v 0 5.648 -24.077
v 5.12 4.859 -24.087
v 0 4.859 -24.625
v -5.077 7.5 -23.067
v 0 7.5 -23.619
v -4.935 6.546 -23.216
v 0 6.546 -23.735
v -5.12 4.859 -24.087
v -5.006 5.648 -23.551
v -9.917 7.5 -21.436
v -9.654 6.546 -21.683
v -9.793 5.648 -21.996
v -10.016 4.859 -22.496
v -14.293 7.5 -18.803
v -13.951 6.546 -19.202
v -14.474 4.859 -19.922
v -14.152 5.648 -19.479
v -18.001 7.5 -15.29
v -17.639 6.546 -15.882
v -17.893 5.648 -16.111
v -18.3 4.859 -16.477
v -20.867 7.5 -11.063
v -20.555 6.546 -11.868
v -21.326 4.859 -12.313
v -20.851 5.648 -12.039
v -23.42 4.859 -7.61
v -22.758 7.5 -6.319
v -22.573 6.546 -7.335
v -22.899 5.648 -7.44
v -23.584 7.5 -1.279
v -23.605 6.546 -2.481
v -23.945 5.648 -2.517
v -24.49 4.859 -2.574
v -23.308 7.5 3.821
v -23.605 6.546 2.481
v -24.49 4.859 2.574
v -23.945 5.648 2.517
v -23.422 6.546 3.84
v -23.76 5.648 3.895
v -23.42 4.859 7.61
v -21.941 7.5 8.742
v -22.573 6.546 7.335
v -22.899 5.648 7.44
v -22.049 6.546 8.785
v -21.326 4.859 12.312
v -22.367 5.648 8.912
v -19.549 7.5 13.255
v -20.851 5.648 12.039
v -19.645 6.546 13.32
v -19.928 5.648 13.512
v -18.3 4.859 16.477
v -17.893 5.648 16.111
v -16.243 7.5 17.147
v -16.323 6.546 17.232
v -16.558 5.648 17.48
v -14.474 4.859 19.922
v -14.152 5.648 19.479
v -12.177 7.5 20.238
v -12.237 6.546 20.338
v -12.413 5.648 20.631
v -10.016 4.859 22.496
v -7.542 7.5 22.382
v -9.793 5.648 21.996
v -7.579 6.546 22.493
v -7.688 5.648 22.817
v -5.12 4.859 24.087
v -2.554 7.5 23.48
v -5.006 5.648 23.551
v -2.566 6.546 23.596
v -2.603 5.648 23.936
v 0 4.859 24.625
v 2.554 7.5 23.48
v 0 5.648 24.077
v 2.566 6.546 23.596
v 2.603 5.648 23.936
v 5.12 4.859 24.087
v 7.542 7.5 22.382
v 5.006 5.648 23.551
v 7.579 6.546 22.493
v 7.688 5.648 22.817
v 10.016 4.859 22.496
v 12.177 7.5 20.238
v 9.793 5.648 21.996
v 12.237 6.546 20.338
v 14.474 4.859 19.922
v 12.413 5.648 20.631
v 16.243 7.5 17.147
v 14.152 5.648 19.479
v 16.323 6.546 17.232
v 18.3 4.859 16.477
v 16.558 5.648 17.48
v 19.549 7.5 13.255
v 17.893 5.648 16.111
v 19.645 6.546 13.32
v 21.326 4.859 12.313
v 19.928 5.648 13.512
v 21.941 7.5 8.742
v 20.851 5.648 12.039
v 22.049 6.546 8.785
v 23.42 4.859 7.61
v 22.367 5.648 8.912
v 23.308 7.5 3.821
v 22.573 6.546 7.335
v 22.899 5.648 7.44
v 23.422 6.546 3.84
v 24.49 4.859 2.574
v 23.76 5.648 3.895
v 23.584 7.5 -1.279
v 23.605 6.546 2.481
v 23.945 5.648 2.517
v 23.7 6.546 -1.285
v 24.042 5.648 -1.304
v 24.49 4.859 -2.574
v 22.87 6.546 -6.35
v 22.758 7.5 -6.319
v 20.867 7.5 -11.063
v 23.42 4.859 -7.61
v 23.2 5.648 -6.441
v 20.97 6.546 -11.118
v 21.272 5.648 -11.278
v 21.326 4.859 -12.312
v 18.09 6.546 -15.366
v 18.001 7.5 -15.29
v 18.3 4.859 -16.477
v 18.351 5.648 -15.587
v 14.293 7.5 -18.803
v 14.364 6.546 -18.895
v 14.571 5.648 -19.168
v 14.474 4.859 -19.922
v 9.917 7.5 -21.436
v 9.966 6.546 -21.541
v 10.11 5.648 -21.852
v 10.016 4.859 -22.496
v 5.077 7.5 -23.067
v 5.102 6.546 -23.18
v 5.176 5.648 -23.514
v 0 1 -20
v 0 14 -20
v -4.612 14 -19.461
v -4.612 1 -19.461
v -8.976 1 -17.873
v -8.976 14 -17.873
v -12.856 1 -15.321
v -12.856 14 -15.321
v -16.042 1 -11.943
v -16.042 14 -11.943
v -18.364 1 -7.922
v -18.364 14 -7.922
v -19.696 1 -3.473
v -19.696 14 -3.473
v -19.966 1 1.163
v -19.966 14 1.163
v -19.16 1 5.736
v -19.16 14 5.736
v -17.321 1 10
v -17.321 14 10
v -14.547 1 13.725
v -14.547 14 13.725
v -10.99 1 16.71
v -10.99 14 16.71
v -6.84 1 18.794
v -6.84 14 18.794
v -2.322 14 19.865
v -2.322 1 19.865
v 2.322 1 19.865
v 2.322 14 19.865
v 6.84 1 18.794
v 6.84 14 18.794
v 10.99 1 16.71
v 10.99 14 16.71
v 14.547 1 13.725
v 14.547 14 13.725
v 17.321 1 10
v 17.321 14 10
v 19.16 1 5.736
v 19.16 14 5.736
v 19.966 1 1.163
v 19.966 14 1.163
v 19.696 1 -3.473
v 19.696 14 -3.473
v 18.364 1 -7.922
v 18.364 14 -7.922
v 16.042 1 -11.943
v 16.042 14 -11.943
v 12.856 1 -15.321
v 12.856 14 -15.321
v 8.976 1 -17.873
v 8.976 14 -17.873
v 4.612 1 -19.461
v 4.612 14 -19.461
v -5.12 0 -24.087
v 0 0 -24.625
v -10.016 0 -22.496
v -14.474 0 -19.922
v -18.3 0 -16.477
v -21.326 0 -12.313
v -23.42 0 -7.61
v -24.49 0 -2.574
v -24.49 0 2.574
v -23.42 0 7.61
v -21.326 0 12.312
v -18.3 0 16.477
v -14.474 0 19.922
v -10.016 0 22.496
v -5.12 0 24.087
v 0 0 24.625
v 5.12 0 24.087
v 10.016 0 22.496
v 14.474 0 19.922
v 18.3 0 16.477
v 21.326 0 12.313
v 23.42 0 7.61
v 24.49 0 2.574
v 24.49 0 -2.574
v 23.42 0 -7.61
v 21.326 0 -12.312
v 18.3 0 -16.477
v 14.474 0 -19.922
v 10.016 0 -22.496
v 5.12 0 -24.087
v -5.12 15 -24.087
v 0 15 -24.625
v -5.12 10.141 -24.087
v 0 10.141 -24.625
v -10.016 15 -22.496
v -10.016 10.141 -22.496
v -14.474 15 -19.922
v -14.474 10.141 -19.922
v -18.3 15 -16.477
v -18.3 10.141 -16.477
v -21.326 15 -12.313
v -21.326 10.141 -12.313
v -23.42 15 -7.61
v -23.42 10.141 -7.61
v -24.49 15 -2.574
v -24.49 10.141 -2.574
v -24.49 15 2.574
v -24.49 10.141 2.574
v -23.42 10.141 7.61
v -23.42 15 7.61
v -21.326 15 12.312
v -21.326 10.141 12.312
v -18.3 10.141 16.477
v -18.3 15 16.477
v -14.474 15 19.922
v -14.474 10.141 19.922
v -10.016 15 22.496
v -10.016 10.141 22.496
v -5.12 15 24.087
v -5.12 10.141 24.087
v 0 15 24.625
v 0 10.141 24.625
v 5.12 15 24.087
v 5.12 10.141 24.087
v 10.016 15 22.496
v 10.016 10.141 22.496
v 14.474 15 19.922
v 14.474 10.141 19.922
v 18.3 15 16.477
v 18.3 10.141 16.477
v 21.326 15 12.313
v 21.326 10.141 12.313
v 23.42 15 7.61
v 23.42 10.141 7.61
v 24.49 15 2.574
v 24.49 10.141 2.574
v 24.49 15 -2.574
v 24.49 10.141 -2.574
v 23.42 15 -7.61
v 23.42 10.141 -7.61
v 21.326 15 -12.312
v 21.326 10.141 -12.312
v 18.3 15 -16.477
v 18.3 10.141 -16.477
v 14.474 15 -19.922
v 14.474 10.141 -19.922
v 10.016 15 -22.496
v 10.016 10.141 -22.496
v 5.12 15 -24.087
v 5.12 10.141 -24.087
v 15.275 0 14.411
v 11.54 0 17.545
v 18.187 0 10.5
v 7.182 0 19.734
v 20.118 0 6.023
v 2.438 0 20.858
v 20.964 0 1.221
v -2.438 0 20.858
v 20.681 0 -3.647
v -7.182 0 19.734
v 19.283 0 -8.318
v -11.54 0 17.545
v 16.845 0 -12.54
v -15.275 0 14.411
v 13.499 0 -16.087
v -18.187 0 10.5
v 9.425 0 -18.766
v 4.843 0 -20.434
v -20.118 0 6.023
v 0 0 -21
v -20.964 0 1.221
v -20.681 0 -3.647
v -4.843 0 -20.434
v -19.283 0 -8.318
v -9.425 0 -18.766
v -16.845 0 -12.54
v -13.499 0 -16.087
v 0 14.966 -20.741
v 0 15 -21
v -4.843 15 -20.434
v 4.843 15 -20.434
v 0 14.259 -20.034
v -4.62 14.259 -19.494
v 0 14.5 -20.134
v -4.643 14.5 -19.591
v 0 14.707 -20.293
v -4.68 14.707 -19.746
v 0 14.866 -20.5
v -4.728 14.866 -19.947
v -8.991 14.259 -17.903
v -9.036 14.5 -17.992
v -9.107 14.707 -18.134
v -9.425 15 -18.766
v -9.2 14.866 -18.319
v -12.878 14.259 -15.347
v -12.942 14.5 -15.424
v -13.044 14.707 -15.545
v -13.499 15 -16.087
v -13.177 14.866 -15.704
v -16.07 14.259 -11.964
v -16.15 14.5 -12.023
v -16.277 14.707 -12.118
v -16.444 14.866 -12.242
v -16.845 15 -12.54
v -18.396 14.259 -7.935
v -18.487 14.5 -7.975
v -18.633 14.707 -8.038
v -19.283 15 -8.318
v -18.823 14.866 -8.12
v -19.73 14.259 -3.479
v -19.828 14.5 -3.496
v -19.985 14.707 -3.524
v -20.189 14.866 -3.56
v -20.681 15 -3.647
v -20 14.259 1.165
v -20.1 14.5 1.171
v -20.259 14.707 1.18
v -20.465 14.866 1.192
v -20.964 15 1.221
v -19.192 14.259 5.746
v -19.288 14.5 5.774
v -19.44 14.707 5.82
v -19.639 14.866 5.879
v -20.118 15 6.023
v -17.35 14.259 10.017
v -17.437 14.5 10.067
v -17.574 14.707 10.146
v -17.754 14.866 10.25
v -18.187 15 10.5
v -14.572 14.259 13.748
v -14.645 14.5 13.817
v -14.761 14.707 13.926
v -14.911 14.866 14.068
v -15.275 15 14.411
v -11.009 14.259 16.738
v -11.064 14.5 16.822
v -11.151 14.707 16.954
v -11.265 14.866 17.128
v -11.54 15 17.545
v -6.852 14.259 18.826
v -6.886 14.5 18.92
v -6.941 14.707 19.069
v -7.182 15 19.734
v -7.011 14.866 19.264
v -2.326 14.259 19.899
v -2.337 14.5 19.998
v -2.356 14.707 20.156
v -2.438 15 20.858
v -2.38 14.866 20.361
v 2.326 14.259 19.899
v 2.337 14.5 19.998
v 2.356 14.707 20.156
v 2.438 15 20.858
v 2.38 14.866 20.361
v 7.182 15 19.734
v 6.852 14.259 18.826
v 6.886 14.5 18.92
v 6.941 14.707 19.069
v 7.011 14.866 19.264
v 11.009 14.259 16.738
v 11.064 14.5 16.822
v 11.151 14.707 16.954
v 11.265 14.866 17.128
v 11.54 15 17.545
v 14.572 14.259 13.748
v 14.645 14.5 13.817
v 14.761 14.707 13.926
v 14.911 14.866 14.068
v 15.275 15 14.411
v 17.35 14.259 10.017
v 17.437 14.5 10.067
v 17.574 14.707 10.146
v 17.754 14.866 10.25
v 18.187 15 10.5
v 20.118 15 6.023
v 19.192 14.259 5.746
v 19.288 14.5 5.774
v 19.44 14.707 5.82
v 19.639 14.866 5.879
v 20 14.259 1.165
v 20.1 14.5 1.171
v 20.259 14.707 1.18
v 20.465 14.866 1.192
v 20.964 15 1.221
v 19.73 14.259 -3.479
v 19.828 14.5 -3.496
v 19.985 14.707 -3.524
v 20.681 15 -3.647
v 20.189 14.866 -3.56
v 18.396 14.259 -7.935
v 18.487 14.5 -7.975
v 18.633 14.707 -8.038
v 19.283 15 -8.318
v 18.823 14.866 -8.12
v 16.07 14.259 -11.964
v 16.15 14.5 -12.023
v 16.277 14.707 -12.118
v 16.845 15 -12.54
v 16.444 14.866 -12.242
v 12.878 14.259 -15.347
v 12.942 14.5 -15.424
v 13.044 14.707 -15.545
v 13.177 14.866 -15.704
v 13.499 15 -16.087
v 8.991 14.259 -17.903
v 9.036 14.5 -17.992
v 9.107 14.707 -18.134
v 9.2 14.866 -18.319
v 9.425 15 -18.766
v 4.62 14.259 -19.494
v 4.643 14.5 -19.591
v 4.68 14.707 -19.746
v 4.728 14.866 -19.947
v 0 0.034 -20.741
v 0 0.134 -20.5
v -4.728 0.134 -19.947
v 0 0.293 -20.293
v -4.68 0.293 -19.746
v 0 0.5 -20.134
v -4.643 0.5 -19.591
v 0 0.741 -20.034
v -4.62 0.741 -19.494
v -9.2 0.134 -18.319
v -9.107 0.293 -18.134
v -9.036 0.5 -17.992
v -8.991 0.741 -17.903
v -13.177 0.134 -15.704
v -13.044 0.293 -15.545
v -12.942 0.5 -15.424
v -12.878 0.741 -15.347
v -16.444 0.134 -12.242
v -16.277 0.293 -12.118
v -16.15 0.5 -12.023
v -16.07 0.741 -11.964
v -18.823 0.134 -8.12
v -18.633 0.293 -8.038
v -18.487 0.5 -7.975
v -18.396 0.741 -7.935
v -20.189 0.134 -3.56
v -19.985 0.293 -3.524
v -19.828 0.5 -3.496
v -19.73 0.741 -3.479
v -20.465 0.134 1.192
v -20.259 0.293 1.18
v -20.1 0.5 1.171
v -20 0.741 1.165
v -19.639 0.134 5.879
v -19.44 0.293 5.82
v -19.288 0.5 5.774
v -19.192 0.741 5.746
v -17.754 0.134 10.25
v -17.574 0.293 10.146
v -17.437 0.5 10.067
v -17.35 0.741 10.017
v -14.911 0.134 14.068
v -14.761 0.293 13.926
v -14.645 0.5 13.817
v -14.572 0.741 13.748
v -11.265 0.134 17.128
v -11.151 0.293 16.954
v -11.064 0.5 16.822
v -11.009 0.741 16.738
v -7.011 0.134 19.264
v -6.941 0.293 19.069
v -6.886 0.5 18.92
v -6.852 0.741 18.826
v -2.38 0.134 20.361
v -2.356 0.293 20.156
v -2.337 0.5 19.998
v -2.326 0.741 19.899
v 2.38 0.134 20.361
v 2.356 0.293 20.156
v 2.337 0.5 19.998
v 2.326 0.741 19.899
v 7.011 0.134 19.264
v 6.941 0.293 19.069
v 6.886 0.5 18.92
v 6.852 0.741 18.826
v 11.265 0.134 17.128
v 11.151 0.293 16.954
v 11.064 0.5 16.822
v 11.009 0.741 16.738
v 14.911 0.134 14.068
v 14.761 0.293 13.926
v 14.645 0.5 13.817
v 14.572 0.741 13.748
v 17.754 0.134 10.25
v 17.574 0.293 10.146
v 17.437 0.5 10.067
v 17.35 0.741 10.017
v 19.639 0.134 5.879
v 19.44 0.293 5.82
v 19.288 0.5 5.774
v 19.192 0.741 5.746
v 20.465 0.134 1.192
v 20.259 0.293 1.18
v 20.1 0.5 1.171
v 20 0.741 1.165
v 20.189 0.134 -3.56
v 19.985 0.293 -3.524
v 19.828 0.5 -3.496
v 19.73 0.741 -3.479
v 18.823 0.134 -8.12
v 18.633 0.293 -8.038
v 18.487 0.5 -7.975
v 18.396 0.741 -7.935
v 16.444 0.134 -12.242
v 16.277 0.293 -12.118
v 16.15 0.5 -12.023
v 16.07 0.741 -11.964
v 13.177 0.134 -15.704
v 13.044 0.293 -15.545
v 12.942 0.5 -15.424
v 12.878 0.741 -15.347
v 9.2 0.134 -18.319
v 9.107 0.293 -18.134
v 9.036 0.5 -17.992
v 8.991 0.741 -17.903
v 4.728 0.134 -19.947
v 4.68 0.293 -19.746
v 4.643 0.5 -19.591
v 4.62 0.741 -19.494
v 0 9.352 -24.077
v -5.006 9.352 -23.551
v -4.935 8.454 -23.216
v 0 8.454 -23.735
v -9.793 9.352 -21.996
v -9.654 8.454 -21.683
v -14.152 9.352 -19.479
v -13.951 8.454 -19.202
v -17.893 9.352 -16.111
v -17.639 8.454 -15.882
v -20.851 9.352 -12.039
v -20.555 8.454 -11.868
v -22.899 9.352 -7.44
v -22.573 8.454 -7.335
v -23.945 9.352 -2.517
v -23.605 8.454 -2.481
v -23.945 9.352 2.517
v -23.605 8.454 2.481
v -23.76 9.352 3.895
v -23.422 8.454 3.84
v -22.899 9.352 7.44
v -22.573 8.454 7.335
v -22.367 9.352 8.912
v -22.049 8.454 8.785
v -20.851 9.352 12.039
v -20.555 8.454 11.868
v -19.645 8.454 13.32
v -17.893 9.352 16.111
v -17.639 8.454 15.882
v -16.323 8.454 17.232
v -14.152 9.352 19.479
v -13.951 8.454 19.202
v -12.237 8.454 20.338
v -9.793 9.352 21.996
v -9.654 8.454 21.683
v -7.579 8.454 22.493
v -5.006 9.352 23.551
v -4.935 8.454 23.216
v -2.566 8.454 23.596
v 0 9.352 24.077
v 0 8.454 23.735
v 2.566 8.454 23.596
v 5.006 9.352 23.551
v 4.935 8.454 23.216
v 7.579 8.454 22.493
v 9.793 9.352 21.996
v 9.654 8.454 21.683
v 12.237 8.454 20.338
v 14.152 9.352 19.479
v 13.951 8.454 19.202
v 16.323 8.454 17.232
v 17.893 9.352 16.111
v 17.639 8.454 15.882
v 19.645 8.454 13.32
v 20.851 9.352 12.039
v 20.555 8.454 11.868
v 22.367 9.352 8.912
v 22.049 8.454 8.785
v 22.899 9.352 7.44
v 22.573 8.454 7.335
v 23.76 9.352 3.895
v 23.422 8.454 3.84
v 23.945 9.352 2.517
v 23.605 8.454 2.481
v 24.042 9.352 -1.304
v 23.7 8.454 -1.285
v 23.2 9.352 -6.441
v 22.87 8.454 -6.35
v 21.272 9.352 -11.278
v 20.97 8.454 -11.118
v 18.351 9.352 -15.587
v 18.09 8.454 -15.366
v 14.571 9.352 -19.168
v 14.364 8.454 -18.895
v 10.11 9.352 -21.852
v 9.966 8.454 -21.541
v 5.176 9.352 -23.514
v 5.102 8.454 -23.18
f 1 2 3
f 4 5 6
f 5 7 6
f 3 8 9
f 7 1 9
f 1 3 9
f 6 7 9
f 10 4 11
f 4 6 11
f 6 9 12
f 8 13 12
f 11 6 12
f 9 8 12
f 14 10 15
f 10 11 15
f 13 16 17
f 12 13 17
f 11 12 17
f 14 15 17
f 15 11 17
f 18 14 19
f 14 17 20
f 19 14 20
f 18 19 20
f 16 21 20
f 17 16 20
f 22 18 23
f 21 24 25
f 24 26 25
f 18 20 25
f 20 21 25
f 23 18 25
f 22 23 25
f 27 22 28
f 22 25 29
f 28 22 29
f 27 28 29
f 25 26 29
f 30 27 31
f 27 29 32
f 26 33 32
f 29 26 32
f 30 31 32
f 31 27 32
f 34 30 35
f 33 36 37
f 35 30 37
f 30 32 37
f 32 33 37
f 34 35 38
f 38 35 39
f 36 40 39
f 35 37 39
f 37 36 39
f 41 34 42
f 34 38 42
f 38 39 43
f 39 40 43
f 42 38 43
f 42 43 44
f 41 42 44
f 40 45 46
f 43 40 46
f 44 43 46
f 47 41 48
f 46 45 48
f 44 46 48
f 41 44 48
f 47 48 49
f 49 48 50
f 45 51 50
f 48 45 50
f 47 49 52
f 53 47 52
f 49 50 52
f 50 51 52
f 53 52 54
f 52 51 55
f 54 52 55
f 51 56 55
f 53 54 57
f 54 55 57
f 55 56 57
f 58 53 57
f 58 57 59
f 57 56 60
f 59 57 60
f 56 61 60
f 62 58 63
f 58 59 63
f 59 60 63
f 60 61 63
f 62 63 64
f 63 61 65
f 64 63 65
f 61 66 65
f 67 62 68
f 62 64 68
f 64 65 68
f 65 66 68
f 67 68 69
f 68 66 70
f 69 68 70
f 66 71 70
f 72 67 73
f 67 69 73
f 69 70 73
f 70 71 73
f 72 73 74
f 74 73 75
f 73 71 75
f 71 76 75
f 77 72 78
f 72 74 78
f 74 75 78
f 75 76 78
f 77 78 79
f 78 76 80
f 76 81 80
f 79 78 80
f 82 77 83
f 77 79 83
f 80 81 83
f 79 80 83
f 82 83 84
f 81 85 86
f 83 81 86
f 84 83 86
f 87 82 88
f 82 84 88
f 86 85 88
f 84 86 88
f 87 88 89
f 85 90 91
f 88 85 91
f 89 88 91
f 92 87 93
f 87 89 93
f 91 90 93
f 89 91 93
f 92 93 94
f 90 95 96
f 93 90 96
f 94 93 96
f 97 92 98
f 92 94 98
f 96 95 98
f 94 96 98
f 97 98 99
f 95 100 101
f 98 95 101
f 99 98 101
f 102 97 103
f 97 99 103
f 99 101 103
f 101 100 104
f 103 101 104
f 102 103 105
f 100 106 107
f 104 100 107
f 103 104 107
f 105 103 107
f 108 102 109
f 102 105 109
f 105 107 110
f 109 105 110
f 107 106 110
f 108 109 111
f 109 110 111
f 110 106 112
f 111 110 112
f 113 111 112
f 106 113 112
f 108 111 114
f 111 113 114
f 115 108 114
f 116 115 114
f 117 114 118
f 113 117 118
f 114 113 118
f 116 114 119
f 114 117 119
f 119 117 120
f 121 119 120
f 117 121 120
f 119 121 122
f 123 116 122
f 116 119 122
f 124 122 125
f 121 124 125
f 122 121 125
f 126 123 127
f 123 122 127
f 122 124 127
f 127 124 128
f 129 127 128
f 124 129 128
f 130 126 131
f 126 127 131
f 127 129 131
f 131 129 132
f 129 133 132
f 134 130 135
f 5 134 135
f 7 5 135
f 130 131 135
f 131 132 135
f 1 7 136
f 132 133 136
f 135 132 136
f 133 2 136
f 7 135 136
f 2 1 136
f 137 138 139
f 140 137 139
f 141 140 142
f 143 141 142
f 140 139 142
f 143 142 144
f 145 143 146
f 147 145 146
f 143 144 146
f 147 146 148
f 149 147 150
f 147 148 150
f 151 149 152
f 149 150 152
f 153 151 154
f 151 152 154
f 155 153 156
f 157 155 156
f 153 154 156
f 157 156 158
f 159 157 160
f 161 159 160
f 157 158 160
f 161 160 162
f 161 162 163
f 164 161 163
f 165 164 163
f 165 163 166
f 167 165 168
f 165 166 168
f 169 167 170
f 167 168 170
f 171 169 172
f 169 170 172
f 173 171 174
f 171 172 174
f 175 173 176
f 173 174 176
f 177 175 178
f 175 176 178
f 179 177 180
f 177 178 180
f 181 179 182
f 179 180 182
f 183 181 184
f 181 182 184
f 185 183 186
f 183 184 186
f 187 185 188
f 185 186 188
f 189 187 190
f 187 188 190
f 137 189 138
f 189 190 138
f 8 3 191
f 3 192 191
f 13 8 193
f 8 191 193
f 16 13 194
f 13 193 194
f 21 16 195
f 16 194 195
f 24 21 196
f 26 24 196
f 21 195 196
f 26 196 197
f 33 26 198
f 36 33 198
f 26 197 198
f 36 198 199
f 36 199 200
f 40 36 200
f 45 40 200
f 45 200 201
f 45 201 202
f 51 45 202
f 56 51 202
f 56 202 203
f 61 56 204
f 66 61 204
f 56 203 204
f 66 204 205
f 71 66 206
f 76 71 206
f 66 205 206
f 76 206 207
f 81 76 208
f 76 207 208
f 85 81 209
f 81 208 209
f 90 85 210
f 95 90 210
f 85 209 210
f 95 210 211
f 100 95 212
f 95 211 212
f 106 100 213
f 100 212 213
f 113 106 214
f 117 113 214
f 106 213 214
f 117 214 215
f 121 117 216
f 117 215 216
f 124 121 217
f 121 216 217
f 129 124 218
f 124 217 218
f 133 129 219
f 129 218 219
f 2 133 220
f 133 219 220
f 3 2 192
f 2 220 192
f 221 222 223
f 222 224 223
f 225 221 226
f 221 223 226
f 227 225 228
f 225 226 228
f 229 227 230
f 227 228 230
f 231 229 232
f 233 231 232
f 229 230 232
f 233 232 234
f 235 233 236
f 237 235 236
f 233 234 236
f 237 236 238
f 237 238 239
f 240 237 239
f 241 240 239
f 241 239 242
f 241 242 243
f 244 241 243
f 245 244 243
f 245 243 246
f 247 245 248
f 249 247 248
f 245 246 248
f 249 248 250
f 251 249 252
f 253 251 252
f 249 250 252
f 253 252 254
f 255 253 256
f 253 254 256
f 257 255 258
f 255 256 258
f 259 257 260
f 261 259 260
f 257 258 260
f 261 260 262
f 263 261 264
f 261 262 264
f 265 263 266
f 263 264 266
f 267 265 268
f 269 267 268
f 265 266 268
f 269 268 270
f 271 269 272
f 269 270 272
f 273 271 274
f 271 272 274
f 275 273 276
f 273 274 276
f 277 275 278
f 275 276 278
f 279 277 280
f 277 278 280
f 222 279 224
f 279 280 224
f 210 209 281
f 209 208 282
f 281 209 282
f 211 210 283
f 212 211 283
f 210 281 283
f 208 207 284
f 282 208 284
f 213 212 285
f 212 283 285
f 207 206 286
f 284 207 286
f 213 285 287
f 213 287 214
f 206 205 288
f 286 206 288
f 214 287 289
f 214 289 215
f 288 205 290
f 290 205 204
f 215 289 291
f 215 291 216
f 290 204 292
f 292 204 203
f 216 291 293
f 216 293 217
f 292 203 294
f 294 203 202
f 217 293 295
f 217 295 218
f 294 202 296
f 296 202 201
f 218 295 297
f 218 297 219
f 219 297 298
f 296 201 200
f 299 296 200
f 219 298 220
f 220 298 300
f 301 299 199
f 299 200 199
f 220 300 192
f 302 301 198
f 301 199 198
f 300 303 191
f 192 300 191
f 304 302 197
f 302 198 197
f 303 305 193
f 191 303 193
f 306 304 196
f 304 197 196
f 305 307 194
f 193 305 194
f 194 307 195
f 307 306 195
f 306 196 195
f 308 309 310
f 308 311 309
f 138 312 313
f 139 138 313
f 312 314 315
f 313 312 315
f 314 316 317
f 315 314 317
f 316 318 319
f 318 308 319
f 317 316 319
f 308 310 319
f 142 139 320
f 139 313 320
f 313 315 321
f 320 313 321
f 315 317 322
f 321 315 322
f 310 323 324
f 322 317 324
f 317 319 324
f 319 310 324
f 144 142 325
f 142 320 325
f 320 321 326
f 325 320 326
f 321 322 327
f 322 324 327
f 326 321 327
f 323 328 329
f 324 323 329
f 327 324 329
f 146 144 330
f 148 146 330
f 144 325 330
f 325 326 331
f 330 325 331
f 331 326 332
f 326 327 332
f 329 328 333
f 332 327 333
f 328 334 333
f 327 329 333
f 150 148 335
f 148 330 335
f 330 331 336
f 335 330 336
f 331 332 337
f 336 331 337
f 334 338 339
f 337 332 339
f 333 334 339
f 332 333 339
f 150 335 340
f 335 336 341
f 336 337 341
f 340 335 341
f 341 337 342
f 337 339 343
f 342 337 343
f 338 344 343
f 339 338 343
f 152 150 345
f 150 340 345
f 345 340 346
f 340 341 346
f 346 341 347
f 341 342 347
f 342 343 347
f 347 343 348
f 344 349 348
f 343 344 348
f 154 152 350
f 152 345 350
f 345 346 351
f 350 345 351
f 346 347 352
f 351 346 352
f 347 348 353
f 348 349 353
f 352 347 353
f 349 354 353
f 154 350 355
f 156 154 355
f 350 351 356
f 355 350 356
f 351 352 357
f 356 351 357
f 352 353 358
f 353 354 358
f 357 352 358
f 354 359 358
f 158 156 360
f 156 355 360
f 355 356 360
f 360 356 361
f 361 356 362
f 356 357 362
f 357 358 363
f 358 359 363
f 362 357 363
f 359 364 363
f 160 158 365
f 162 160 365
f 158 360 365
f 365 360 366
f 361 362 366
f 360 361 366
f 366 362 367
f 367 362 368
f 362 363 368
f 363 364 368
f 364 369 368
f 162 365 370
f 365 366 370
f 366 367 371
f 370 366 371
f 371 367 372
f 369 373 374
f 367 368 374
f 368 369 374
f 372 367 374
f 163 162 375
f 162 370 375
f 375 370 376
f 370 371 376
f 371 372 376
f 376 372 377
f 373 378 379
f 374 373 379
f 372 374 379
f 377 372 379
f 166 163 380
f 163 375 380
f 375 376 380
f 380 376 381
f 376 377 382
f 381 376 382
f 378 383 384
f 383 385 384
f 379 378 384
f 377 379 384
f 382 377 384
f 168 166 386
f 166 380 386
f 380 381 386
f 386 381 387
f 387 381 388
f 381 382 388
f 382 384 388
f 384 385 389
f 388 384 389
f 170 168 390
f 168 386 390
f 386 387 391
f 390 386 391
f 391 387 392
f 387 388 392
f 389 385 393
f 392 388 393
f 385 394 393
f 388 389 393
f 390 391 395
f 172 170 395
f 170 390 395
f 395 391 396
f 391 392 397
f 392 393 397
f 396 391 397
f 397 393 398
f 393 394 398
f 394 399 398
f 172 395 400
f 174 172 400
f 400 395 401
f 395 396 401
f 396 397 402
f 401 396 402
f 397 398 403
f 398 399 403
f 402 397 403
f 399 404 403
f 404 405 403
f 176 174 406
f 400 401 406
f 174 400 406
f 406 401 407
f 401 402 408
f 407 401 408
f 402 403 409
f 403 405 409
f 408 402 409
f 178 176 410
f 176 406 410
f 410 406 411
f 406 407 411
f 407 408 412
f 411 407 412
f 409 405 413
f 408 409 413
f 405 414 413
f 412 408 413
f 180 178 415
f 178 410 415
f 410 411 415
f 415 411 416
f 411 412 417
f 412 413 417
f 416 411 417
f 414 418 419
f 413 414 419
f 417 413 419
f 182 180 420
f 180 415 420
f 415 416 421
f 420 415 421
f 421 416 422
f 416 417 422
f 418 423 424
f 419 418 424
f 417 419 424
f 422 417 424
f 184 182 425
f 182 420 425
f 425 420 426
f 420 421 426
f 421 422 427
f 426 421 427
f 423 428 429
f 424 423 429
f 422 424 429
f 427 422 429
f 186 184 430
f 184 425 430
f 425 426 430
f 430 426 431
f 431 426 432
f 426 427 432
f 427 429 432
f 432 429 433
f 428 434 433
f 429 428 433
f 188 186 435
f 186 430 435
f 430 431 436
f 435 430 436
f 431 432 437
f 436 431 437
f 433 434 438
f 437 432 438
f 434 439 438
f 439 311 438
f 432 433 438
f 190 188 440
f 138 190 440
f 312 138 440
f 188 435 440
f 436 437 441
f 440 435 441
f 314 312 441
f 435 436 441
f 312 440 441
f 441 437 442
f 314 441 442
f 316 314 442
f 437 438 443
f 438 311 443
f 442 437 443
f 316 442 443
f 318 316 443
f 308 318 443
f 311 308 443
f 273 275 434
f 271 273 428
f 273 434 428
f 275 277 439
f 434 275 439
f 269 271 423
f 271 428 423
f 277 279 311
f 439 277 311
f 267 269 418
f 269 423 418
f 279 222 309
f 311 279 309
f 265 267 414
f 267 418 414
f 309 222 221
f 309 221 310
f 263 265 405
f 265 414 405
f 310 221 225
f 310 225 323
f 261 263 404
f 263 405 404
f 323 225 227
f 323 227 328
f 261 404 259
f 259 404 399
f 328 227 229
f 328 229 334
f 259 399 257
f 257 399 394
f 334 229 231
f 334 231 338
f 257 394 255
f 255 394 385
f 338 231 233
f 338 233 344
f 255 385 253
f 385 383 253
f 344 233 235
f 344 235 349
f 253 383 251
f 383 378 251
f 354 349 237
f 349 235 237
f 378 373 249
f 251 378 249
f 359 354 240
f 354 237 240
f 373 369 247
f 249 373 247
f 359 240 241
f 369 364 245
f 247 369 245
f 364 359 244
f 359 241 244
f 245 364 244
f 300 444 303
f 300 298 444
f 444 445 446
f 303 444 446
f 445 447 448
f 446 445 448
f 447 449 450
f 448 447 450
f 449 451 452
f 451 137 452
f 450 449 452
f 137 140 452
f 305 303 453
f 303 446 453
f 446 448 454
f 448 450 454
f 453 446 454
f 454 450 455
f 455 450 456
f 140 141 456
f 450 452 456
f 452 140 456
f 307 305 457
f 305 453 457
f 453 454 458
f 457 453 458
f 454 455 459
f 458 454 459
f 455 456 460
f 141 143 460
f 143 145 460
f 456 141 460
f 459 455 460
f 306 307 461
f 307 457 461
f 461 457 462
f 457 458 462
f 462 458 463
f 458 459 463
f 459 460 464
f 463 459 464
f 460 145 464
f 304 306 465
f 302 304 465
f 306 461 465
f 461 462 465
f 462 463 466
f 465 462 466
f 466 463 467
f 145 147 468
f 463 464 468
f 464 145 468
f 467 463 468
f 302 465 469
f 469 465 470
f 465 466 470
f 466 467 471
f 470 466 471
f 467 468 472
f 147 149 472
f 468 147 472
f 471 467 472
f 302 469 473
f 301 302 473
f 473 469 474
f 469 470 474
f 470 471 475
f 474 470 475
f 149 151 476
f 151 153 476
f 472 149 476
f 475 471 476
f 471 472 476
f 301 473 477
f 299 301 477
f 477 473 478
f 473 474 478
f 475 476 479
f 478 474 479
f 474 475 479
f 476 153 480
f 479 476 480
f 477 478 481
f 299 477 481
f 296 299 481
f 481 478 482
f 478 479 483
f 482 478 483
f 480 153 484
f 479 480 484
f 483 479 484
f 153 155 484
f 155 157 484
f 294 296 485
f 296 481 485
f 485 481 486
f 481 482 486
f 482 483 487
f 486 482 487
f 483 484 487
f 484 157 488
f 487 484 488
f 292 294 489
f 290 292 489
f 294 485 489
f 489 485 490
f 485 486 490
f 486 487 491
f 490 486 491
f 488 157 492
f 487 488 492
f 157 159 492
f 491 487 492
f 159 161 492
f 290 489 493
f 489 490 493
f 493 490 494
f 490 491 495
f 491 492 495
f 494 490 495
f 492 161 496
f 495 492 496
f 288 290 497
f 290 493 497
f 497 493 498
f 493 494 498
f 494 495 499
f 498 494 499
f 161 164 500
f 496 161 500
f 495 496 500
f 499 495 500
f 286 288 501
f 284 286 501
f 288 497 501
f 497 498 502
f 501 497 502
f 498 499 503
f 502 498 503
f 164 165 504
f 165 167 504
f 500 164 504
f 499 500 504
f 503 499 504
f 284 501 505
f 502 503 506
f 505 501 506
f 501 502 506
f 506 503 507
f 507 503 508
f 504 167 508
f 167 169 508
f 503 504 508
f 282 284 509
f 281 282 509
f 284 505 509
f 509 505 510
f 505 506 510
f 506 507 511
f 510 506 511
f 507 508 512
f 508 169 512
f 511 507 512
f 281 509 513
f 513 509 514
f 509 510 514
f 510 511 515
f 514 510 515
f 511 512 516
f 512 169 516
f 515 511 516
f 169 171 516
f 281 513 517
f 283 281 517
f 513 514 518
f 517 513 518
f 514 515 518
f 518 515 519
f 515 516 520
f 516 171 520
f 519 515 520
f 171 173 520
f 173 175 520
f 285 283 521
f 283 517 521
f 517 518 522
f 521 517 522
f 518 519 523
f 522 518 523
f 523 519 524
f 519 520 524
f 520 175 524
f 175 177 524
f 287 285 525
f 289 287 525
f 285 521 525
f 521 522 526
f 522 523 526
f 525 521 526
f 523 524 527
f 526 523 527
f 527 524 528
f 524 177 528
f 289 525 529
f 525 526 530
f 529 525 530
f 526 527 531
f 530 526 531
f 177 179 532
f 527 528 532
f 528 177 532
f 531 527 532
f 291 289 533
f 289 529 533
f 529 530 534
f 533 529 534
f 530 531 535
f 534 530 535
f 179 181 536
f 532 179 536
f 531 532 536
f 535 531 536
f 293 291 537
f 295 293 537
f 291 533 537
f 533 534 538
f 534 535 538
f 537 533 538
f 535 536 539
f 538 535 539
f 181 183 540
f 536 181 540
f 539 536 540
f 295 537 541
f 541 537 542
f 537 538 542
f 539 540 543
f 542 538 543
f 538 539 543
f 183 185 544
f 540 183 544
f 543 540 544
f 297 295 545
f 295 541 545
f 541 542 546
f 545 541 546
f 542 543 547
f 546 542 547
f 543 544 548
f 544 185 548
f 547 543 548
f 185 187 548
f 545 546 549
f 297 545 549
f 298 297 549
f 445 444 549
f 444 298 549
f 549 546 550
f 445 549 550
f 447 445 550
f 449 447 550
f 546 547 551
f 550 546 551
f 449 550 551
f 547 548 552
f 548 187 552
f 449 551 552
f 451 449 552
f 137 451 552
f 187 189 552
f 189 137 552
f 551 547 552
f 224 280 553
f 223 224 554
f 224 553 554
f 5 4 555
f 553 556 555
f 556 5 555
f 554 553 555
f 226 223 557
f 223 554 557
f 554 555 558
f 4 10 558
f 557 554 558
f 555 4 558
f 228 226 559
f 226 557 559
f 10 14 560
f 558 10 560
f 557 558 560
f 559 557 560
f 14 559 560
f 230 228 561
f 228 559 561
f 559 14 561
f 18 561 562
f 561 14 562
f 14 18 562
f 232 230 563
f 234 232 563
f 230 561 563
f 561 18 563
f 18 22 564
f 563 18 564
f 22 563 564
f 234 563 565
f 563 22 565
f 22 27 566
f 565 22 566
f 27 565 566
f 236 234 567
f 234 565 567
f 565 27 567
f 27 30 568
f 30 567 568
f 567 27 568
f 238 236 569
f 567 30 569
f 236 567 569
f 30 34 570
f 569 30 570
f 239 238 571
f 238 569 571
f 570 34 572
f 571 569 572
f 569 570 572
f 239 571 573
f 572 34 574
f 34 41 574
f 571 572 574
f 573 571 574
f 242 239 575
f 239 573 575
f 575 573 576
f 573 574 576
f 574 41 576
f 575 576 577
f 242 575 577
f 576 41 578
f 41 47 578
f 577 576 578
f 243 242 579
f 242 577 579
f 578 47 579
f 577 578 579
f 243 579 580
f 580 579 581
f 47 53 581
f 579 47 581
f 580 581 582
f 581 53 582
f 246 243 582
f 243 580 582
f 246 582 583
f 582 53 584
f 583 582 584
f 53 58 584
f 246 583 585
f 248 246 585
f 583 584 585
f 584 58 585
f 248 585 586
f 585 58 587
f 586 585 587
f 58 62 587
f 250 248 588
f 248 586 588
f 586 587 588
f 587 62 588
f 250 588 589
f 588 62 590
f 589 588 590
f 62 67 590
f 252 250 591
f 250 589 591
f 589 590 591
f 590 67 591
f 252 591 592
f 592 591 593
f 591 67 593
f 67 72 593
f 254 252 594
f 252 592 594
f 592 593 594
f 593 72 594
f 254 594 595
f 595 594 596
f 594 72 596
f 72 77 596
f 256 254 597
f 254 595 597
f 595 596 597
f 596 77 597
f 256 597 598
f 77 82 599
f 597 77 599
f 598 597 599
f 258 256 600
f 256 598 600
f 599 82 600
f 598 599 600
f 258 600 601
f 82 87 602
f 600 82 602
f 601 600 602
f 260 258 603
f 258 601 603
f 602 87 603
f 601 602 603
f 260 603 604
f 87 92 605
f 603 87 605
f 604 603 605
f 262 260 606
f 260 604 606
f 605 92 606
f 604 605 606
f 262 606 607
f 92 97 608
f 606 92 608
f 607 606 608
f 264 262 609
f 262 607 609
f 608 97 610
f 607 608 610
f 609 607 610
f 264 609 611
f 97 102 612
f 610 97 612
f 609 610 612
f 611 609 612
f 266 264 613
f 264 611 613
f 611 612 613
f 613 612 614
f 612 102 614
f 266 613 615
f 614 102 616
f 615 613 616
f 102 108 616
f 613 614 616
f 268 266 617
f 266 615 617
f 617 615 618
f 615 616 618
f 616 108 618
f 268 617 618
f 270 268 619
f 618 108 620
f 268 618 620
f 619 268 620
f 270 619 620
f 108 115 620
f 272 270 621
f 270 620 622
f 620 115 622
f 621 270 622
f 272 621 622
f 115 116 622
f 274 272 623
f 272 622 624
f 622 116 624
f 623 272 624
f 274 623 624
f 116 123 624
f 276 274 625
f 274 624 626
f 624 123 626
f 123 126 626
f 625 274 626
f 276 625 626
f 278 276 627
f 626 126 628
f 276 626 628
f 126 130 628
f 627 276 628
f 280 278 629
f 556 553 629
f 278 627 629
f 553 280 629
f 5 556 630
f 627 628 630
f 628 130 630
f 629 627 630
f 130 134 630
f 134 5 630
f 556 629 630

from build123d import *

# Parameters (mm, degrees)
FILLET1_R = 1


with BuildPart() as part:
    # Sketch1 → Revolve2 (revolve)
    with BuildSketch(Plane.XY, mode=Mode.PRIVATE) as revolve2_sk:
        with BuildLine():
            ThreePointArc((-23.61875, 7.5), (-23.878834577, 6.086926278), (-24.625, 4.859058821))
            Line((-24.625, 4.859058821), (-24.625, 0))
            Line((-24.625, 0), (-20, 0))
            Line((-20, 0), (-20, 15))
            Line((-20, 15), (-24.625, 15))
            Line((-24.625, 15), (-24.625, 10.140941179))
            ThreePointArc((-24.625, 10.140941179), (-23.878834577, 8.913073722), (-23.61875, 7.5))
        make_face()
    revolve(revolve2_sk.sketch.rotate(Axis((0, 0, 0), (0, 1, 0)), 270), axis=Axis((0, 0, 0), (0, 1, 0)))

    # Fillet1
    fillet1_edges = [part.edges().sort_by_distance(p)[0] for p in [
        (0, 15, 20),
        (0, 0, 20),
    ]]
    fillet(fillet1_edges, radius=FILLET1_R)


solid = part.part
